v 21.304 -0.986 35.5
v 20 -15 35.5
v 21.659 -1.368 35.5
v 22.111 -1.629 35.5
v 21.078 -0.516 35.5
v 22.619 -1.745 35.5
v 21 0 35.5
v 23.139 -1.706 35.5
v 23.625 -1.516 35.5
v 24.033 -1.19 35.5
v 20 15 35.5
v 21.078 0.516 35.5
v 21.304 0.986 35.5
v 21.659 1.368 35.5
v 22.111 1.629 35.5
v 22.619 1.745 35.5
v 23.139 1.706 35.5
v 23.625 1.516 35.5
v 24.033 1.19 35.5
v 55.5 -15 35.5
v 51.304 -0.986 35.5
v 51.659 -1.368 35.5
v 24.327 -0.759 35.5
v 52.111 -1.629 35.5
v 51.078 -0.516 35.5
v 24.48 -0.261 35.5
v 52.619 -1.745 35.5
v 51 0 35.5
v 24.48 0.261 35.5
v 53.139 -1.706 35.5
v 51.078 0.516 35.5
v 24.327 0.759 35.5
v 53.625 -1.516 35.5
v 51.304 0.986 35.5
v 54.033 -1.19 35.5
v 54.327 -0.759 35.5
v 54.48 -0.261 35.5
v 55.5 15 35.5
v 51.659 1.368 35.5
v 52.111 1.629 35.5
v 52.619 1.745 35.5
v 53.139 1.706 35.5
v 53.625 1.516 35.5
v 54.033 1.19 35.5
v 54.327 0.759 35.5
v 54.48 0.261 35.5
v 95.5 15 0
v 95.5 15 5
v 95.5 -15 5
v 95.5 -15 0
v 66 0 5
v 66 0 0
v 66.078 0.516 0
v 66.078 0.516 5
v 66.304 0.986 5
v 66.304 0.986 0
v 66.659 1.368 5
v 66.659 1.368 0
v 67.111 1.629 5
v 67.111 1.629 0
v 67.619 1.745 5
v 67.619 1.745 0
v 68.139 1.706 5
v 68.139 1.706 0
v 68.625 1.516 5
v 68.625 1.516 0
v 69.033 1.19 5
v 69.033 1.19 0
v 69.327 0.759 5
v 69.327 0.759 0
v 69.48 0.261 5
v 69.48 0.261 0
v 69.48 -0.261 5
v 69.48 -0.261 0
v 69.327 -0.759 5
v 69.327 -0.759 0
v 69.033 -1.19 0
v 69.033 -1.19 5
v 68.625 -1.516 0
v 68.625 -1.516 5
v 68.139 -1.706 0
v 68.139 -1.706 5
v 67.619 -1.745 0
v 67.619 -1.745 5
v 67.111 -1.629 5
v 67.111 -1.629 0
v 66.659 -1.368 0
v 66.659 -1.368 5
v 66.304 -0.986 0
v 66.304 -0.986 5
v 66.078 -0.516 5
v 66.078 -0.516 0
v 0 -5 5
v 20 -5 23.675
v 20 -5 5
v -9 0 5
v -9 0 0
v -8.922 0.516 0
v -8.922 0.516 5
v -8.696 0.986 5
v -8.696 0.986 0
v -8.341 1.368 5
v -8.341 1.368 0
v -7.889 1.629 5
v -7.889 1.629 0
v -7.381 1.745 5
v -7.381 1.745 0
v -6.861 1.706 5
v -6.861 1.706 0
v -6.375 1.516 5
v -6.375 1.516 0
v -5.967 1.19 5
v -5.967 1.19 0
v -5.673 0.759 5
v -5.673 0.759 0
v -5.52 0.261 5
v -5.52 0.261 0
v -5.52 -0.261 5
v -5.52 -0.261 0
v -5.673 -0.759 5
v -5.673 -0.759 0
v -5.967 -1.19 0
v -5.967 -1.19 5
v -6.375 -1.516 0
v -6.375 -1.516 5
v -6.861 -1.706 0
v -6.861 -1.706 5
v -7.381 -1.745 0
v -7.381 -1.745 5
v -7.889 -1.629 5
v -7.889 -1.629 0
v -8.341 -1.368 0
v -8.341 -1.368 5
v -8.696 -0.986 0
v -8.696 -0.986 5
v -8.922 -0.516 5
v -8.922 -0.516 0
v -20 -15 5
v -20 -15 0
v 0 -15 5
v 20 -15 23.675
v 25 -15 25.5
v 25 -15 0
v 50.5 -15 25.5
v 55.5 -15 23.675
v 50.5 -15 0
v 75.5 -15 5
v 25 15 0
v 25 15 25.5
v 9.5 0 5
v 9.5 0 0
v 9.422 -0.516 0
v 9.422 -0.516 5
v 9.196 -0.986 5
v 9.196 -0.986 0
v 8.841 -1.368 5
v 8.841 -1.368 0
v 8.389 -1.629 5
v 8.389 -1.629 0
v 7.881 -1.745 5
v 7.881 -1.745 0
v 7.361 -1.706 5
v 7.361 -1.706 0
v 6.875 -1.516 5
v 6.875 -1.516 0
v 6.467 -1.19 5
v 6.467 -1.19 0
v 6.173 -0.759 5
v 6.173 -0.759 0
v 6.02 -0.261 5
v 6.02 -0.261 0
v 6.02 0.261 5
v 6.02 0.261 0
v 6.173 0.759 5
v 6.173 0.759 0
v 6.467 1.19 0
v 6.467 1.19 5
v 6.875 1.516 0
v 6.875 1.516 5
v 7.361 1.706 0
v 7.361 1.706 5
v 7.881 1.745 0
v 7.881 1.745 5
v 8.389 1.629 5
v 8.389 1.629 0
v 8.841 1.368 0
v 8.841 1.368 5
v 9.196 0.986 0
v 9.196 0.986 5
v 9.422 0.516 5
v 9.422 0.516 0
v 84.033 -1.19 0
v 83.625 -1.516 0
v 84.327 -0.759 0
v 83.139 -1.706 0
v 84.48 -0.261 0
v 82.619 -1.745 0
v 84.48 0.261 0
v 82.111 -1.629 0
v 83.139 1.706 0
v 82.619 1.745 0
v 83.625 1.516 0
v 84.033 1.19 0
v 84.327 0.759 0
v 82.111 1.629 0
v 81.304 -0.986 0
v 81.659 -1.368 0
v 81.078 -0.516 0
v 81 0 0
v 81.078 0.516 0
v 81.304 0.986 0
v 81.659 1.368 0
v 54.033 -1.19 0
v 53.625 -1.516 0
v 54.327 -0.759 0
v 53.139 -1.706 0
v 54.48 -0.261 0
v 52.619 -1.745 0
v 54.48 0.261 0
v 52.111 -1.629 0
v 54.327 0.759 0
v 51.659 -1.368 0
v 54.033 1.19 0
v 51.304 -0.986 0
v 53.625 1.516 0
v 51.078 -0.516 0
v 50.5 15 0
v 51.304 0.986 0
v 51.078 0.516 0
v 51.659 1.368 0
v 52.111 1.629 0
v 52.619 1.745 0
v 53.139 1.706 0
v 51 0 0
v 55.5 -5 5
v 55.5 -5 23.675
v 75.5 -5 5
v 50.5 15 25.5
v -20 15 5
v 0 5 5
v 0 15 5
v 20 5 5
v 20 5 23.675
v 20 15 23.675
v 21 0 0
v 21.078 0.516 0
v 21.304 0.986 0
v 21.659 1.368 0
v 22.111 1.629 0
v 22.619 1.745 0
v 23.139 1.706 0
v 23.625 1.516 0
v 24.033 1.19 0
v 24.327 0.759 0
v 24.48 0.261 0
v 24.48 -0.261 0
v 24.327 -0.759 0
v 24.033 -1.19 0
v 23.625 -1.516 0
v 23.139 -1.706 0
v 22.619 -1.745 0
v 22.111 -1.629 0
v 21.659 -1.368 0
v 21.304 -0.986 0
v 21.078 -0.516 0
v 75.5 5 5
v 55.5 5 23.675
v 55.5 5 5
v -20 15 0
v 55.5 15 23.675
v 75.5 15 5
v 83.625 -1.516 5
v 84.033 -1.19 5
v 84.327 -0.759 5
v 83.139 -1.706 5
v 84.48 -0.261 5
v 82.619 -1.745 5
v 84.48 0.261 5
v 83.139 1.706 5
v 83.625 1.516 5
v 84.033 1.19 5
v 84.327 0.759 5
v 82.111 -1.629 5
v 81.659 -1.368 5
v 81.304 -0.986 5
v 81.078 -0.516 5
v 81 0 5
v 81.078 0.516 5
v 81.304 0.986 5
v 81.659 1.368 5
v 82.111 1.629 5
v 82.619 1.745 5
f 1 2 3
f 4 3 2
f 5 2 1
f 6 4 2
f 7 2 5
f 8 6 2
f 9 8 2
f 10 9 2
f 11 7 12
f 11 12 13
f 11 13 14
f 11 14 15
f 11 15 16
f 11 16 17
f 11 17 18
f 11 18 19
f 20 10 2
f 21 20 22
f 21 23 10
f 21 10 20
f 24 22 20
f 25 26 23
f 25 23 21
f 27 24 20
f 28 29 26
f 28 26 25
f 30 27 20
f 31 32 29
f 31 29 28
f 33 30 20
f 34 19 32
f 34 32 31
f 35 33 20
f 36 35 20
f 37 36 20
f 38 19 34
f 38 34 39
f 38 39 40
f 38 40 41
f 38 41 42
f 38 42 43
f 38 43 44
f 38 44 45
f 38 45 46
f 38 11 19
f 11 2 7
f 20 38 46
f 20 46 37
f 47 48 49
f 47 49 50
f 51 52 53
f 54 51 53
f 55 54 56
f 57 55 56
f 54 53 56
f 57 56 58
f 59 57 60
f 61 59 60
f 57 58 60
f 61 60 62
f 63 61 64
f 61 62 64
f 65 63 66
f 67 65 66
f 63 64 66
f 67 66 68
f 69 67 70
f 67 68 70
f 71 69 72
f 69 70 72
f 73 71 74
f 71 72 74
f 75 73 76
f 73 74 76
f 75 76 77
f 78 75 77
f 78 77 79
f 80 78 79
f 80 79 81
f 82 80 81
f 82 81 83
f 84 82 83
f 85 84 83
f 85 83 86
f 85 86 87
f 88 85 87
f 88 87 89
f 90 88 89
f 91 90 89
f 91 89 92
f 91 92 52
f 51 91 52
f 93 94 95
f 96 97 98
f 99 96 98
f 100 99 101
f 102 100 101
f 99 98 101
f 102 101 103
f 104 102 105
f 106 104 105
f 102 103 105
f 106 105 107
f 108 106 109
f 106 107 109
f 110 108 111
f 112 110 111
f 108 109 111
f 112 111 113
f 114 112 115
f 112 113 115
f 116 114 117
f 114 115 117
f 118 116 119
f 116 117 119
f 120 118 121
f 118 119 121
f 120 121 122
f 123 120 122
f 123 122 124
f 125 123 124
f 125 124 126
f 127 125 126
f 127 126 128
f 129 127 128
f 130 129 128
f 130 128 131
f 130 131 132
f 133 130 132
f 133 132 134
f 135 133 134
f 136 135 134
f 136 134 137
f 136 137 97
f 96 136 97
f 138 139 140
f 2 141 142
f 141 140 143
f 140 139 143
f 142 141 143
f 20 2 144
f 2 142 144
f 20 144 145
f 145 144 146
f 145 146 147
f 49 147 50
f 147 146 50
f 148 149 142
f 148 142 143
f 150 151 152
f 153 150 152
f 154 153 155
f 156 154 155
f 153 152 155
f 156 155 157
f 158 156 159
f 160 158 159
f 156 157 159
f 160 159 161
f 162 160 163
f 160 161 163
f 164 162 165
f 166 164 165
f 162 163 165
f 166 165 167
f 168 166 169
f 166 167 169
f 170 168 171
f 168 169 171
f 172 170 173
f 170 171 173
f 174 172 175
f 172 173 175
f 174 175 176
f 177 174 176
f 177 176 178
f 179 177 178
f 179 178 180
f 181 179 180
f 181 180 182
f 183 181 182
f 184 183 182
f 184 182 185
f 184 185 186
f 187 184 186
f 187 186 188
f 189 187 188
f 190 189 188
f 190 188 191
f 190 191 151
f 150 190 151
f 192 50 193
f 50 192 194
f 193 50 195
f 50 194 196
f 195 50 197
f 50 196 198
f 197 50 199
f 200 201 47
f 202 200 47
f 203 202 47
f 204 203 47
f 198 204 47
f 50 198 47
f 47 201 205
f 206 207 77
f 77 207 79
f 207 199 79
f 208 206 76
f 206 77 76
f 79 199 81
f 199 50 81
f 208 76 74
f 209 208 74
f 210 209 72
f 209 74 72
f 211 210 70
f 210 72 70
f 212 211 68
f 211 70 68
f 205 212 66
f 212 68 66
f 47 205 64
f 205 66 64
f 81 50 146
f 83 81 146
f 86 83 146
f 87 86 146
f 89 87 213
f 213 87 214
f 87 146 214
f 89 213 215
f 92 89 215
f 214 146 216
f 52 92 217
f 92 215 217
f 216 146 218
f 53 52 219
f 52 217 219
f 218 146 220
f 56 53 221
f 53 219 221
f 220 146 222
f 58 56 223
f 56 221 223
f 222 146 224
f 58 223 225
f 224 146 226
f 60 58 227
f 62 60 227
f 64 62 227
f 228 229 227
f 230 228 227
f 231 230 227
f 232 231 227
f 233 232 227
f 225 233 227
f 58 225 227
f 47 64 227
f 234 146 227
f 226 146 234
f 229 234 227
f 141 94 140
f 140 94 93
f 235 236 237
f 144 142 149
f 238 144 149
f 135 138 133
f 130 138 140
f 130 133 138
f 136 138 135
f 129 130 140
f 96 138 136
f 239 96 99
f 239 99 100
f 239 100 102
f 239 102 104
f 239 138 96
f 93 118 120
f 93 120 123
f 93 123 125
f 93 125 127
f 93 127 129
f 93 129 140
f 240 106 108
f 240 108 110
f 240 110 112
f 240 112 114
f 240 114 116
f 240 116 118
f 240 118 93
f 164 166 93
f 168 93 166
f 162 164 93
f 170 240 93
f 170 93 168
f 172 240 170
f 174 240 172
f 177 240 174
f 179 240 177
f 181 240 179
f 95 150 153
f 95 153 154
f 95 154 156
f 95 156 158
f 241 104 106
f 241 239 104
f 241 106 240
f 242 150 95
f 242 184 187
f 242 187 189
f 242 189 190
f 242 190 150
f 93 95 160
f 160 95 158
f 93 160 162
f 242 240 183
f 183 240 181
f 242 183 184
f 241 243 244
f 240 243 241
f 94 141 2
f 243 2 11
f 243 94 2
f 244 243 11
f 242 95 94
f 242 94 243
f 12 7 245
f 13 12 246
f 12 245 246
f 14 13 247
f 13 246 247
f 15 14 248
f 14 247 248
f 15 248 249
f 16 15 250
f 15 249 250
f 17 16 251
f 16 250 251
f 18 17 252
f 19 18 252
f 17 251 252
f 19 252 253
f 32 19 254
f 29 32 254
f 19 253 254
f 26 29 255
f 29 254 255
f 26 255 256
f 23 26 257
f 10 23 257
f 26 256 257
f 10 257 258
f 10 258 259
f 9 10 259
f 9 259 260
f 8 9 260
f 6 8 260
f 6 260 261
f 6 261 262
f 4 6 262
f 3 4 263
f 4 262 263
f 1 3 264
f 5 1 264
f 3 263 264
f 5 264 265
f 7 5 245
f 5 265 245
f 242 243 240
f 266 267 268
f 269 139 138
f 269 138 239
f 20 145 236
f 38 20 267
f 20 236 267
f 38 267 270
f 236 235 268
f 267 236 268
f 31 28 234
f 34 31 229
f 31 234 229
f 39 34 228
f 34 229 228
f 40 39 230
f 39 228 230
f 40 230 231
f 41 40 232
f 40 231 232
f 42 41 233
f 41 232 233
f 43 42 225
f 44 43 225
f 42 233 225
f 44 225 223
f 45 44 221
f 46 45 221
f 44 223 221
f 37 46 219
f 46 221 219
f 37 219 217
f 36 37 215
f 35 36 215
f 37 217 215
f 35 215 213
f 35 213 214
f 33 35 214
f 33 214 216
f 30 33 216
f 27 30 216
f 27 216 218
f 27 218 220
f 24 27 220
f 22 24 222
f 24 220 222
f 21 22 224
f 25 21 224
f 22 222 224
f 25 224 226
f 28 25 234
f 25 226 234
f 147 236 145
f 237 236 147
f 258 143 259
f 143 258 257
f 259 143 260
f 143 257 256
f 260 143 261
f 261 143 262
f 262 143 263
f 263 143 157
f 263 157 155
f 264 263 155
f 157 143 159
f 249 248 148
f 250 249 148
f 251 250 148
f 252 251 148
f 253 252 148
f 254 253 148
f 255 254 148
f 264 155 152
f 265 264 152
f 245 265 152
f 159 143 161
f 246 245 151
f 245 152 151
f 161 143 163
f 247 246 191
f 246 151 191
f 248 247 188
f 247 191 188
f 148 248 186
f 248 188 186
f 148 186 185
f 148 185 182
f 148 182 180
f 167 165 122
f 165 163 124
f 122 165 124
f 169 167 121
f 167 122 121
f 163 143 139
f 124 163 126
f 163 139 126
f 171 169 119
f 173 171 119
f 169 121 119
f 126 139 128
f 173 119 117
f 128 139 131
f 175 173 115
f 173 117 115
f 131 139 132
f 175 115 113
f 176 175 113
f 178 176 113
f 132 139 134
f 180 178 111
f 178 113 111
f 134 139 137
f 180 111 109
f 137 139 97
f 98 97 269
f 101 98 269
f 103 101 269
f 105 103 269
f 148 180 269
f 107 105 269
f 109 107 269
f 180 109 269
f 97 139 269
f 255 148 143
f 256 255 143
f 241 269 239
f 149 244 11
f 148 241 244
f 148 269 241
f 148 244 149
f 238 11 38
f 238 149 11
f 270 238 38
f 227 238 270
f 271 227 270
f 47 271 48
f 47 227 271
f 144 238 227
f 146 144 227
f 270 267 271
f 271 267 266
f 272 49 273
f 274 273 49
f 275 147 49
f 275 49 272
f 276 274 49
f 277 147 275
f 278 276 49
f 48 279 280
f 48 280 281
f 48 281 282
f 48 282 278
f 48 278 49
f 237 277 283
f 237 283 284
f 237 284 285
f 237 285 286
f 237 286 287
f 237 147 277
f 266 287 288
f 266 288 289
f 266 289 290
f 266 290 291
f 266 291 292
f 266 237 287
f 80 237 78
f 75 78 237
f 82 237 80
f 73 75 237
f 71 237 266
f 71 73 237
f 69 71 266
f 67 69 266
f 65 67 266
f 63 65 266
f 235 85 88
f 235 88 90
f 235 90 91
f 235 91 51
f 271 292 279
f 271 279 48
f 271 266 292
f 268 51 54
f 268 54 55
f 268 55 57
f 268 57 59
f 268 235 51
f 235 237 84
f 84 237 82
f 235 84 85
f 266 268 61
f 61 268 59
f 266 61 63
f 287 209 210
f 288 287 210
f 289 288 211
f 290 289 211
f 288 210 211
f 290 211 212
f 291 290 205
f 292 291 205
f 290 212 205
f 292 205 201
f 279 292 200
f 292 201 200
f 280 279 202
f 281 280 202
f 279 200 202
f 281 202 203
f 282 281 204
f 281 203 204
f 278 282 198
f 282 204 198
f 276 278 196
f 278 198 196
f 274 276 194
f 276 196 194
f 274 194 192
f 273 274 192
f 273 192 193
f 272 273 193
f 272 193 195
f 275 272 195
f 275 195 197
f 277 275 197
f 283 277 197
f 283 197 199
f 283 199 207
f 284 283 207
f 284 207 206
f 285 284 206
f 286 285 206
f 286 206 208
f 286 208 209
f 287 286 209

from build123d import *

# Parameters (mm, degrees)
SKETCH_1_W               = 40
SKETCH_1_H               = 30
EXTRUDE_1_DEPTH          = 5
SKETCH_2_W               = 25.5
SKETCH_2_H               = 30
EXTRUDE_2_DEPTH          = 5
SKETCH_3_W               = 5
SKETCH_3_H               = 30
EXTRUDE_3_DEPTH          = 30.5
SKETCH_5_W               = 30.5
SKETCH_5_H               = 30
EXTRUDE_4_DEPTH          = 5
SKETCH_6_W               = 5
SKETCH_6_H               = 30
EXTRUDE_5_DEPTH          = 40
RIB_1_REACH              = 106.645
SKETCH_9_WALL_W          = 238.652565268
SKETCH_9_WALL_H          = 10
MIRROR_2_COPY_1_REACH    = 106.645
MIRROR_2_COPY_1_SKETCH_W = 238.652565268
MIRROR_2_COPY_1_SKETCH_H = 10
SKETCH_10_R              = 1.75
CUT_EXTRUDE_1_DEPTH      = 82
SKETCH_11_R              = 1.75
CUT_EXTRUDE_2_DEPTH      = 40
SKETCH_12_W              = 35.5
SKETCH_12_H              = 30
EXTRUDE_6_DEPTH          = 5
SKETCH_13_R              = 1.75
CUT_EXTRUDE_3_DEPTH      = 66


with BuildPart() as part:
    # 草图1 → 凸台-拉伸1 (new body)
    with BuildSketch(Plane.XY):
        Rectangle(SKETCH_1_W, SKETCH_1_H)
    extrude(amount=EXTRUDE_1_DEPTH)

    # 草图2 → 凸台-拉伸2 (add)
    with BuildSketch(Plane(origin=(20, 0, 0), x_dir=(0, 0, -1), z_dir=(1, 0, 0))):
        with Locations((-12.75, 0)):
            Rectangle(SKETCH_2_W, SKETCH_2_H)
    extrude(amount=EXTRUDE_2_DEPTH)

    # 草图3 → 凸台-拉伸3 (add)
    with BuildSketch(Plane.ZY.offset(-20)):
        with Locations((28, 0)):
            Rectangle(SKETCH_3_W, SKETCH_3_H)
    extrude(amount=-EXTRUDE_3_DEPTH)

    # 草图5 → 凸台-拉伸4 (add)
    with BuildSketch(Plane(origin=(50.5, 0, 0), x_dir=(0, 0, -1), z_dir=(1, 0, 0))):
        with Locations((-15.25, 0)):
            Rectangle(SKETCH_5_W, SKETCH_5_H)
    extrude(amount=EXTRUDE_4_DEPTH)

    # 草图6 → 凸台-拉伸5 (add)
    with BuildSketch(Plane(origin=(55.5, 0, 0), x_dir=(0, 0, -1), z_dir=(1, 0, 0))):
        with Locations((-2.5, 0)):
            Rectangle(SKETCH_6_W, SKETCH_6_H)
    extrude(amount=EXTRUDE_5_DEPTH)

    # 草图9 wall → 筋1 (add, up to next)
    with BuildSketch(Plane(origin=(65.5, -15, 14.337421174), x_dir=(0.730906214245, 0, -0.68247791611), z_dir=(0.68247791611, 0, 0.730906214245)), mode=Mode.PRIVATE) as rib_1_sk1:
        with Locations((0, 5)):
            Rectangle(SKETCH_9_WALL_W, SKETCH_9_WALL_H)
    rib_1_tool1 = extrude(rib_1_sk1.sketch, amount=-RIB_1_REACH, mode=Mode.PRIVATE) - part.part
    rib_1 = rib_1_tool1.solids().sort_by_distance((65.5, -15, 14.337421174))[0]
    add(rib_1)

    # 镜向1: 筋1 across plane
    add(rib_1.mirror(Plane.ZX))

    # 镜向2: 筋1 across plane
    add(rib_1.mirror(Plane(origin=(37.75, 0, 0), x_dir=(0, 0, 1), z_dir=(1, 0, 0))))

    # 镜向2 copy 1 sketch → 镜向2 copy 1 (add, up to next)
    with BuildSketch(Plane(origin=(10, 15, 14.337421174), x_dir=(-0.730906214245, 0, -0.68247791611), z_dir=(-0.68247791611, 0, 0.730906214245)), mode=Mode.PRIVATE) as mirror_2_copy_1_sk1:
        with Locations((0, 5)):
            Rectangle(MIRROR_2_COPY_1_SKETCH_W, MIRROR_2_COPY_1_SKETCH_H)
    mirror_2_copy_1_tool1 = extrude(mirror_2_copy_1_sk1.sketch, amount=-MIRROR_2_COPY_1_REACH, mode=Mode.PRIVATE) - part.part
    add(mirror_2_copy_1_tool1.solids().sort_by_distance((10, 15, 14.337421174))[0])

    # 草图10 → 切除-拉伸1 (cut)
    with BuildSketch(Plane(origin=(0, 0, 0), x_dir=(-1, 0, 0), z_dir=(0, 0, -1))):
        with Locations((-52.75, 0)):
            Circle(SKETCH_10_R)
        with Locations((-22.75, 0)):
            Circle(SKETCH_10_R)
        with Locations((-82.75, 0)):
            Circle(SKETCH_10_R)
        with Locations((7.25, 0)):
            Circle(SKETCH_10_R)
    extrude(amount=-CUT_EXTRUDE_1_DEPTH, mode=Mode.SUBTRACT)

    # 草图11 → 切除-拉伸2 (cut)
    with BuildSketch(Plane(origin=(0, 0, 0), x_dir=(-1, 0, 0), z_dir=(0, 0, -1))):
        with Locations((-67.75, 0)):
            Circle(SKETCH_11_R)
        with Locations(Location((-7.75, 0, 0), (0, 0, 180))):
            Circle(SKETCH_11_R)
    extrude(amount=-CUT_EXTRUDE_2_DEPTH, mode=Mode.SUBTRACT)

    # 草图12 → 凸台-拉伸6 (add)
    with BuildSketch(Plane.XY.offset(30.5)):
        with Locations((37.75, 0)):
            Rectangle(SKETCH_12_W, SKETCH_12_H)
    extrude(amount=EXTRUDE_6_DEPTH)

    # 草图13 → 切除-拉伸3 (cut)
    with BuildSketch(Plane(origin=(0, 0, 0), x_dir=(-1, 0, 0), z_dir=(0, 0, -1))):
        with Locations((-22.75, 0)):
            Circle(SKETCH_13_R)
        with Locations((-52.75, 0)):
            Circle(SKETCH_13_R)
    extrude(amount=-CUT_EXTRUDE_3_DEPTH, mode=Mode.SUBTRACT)


solid = part.part
